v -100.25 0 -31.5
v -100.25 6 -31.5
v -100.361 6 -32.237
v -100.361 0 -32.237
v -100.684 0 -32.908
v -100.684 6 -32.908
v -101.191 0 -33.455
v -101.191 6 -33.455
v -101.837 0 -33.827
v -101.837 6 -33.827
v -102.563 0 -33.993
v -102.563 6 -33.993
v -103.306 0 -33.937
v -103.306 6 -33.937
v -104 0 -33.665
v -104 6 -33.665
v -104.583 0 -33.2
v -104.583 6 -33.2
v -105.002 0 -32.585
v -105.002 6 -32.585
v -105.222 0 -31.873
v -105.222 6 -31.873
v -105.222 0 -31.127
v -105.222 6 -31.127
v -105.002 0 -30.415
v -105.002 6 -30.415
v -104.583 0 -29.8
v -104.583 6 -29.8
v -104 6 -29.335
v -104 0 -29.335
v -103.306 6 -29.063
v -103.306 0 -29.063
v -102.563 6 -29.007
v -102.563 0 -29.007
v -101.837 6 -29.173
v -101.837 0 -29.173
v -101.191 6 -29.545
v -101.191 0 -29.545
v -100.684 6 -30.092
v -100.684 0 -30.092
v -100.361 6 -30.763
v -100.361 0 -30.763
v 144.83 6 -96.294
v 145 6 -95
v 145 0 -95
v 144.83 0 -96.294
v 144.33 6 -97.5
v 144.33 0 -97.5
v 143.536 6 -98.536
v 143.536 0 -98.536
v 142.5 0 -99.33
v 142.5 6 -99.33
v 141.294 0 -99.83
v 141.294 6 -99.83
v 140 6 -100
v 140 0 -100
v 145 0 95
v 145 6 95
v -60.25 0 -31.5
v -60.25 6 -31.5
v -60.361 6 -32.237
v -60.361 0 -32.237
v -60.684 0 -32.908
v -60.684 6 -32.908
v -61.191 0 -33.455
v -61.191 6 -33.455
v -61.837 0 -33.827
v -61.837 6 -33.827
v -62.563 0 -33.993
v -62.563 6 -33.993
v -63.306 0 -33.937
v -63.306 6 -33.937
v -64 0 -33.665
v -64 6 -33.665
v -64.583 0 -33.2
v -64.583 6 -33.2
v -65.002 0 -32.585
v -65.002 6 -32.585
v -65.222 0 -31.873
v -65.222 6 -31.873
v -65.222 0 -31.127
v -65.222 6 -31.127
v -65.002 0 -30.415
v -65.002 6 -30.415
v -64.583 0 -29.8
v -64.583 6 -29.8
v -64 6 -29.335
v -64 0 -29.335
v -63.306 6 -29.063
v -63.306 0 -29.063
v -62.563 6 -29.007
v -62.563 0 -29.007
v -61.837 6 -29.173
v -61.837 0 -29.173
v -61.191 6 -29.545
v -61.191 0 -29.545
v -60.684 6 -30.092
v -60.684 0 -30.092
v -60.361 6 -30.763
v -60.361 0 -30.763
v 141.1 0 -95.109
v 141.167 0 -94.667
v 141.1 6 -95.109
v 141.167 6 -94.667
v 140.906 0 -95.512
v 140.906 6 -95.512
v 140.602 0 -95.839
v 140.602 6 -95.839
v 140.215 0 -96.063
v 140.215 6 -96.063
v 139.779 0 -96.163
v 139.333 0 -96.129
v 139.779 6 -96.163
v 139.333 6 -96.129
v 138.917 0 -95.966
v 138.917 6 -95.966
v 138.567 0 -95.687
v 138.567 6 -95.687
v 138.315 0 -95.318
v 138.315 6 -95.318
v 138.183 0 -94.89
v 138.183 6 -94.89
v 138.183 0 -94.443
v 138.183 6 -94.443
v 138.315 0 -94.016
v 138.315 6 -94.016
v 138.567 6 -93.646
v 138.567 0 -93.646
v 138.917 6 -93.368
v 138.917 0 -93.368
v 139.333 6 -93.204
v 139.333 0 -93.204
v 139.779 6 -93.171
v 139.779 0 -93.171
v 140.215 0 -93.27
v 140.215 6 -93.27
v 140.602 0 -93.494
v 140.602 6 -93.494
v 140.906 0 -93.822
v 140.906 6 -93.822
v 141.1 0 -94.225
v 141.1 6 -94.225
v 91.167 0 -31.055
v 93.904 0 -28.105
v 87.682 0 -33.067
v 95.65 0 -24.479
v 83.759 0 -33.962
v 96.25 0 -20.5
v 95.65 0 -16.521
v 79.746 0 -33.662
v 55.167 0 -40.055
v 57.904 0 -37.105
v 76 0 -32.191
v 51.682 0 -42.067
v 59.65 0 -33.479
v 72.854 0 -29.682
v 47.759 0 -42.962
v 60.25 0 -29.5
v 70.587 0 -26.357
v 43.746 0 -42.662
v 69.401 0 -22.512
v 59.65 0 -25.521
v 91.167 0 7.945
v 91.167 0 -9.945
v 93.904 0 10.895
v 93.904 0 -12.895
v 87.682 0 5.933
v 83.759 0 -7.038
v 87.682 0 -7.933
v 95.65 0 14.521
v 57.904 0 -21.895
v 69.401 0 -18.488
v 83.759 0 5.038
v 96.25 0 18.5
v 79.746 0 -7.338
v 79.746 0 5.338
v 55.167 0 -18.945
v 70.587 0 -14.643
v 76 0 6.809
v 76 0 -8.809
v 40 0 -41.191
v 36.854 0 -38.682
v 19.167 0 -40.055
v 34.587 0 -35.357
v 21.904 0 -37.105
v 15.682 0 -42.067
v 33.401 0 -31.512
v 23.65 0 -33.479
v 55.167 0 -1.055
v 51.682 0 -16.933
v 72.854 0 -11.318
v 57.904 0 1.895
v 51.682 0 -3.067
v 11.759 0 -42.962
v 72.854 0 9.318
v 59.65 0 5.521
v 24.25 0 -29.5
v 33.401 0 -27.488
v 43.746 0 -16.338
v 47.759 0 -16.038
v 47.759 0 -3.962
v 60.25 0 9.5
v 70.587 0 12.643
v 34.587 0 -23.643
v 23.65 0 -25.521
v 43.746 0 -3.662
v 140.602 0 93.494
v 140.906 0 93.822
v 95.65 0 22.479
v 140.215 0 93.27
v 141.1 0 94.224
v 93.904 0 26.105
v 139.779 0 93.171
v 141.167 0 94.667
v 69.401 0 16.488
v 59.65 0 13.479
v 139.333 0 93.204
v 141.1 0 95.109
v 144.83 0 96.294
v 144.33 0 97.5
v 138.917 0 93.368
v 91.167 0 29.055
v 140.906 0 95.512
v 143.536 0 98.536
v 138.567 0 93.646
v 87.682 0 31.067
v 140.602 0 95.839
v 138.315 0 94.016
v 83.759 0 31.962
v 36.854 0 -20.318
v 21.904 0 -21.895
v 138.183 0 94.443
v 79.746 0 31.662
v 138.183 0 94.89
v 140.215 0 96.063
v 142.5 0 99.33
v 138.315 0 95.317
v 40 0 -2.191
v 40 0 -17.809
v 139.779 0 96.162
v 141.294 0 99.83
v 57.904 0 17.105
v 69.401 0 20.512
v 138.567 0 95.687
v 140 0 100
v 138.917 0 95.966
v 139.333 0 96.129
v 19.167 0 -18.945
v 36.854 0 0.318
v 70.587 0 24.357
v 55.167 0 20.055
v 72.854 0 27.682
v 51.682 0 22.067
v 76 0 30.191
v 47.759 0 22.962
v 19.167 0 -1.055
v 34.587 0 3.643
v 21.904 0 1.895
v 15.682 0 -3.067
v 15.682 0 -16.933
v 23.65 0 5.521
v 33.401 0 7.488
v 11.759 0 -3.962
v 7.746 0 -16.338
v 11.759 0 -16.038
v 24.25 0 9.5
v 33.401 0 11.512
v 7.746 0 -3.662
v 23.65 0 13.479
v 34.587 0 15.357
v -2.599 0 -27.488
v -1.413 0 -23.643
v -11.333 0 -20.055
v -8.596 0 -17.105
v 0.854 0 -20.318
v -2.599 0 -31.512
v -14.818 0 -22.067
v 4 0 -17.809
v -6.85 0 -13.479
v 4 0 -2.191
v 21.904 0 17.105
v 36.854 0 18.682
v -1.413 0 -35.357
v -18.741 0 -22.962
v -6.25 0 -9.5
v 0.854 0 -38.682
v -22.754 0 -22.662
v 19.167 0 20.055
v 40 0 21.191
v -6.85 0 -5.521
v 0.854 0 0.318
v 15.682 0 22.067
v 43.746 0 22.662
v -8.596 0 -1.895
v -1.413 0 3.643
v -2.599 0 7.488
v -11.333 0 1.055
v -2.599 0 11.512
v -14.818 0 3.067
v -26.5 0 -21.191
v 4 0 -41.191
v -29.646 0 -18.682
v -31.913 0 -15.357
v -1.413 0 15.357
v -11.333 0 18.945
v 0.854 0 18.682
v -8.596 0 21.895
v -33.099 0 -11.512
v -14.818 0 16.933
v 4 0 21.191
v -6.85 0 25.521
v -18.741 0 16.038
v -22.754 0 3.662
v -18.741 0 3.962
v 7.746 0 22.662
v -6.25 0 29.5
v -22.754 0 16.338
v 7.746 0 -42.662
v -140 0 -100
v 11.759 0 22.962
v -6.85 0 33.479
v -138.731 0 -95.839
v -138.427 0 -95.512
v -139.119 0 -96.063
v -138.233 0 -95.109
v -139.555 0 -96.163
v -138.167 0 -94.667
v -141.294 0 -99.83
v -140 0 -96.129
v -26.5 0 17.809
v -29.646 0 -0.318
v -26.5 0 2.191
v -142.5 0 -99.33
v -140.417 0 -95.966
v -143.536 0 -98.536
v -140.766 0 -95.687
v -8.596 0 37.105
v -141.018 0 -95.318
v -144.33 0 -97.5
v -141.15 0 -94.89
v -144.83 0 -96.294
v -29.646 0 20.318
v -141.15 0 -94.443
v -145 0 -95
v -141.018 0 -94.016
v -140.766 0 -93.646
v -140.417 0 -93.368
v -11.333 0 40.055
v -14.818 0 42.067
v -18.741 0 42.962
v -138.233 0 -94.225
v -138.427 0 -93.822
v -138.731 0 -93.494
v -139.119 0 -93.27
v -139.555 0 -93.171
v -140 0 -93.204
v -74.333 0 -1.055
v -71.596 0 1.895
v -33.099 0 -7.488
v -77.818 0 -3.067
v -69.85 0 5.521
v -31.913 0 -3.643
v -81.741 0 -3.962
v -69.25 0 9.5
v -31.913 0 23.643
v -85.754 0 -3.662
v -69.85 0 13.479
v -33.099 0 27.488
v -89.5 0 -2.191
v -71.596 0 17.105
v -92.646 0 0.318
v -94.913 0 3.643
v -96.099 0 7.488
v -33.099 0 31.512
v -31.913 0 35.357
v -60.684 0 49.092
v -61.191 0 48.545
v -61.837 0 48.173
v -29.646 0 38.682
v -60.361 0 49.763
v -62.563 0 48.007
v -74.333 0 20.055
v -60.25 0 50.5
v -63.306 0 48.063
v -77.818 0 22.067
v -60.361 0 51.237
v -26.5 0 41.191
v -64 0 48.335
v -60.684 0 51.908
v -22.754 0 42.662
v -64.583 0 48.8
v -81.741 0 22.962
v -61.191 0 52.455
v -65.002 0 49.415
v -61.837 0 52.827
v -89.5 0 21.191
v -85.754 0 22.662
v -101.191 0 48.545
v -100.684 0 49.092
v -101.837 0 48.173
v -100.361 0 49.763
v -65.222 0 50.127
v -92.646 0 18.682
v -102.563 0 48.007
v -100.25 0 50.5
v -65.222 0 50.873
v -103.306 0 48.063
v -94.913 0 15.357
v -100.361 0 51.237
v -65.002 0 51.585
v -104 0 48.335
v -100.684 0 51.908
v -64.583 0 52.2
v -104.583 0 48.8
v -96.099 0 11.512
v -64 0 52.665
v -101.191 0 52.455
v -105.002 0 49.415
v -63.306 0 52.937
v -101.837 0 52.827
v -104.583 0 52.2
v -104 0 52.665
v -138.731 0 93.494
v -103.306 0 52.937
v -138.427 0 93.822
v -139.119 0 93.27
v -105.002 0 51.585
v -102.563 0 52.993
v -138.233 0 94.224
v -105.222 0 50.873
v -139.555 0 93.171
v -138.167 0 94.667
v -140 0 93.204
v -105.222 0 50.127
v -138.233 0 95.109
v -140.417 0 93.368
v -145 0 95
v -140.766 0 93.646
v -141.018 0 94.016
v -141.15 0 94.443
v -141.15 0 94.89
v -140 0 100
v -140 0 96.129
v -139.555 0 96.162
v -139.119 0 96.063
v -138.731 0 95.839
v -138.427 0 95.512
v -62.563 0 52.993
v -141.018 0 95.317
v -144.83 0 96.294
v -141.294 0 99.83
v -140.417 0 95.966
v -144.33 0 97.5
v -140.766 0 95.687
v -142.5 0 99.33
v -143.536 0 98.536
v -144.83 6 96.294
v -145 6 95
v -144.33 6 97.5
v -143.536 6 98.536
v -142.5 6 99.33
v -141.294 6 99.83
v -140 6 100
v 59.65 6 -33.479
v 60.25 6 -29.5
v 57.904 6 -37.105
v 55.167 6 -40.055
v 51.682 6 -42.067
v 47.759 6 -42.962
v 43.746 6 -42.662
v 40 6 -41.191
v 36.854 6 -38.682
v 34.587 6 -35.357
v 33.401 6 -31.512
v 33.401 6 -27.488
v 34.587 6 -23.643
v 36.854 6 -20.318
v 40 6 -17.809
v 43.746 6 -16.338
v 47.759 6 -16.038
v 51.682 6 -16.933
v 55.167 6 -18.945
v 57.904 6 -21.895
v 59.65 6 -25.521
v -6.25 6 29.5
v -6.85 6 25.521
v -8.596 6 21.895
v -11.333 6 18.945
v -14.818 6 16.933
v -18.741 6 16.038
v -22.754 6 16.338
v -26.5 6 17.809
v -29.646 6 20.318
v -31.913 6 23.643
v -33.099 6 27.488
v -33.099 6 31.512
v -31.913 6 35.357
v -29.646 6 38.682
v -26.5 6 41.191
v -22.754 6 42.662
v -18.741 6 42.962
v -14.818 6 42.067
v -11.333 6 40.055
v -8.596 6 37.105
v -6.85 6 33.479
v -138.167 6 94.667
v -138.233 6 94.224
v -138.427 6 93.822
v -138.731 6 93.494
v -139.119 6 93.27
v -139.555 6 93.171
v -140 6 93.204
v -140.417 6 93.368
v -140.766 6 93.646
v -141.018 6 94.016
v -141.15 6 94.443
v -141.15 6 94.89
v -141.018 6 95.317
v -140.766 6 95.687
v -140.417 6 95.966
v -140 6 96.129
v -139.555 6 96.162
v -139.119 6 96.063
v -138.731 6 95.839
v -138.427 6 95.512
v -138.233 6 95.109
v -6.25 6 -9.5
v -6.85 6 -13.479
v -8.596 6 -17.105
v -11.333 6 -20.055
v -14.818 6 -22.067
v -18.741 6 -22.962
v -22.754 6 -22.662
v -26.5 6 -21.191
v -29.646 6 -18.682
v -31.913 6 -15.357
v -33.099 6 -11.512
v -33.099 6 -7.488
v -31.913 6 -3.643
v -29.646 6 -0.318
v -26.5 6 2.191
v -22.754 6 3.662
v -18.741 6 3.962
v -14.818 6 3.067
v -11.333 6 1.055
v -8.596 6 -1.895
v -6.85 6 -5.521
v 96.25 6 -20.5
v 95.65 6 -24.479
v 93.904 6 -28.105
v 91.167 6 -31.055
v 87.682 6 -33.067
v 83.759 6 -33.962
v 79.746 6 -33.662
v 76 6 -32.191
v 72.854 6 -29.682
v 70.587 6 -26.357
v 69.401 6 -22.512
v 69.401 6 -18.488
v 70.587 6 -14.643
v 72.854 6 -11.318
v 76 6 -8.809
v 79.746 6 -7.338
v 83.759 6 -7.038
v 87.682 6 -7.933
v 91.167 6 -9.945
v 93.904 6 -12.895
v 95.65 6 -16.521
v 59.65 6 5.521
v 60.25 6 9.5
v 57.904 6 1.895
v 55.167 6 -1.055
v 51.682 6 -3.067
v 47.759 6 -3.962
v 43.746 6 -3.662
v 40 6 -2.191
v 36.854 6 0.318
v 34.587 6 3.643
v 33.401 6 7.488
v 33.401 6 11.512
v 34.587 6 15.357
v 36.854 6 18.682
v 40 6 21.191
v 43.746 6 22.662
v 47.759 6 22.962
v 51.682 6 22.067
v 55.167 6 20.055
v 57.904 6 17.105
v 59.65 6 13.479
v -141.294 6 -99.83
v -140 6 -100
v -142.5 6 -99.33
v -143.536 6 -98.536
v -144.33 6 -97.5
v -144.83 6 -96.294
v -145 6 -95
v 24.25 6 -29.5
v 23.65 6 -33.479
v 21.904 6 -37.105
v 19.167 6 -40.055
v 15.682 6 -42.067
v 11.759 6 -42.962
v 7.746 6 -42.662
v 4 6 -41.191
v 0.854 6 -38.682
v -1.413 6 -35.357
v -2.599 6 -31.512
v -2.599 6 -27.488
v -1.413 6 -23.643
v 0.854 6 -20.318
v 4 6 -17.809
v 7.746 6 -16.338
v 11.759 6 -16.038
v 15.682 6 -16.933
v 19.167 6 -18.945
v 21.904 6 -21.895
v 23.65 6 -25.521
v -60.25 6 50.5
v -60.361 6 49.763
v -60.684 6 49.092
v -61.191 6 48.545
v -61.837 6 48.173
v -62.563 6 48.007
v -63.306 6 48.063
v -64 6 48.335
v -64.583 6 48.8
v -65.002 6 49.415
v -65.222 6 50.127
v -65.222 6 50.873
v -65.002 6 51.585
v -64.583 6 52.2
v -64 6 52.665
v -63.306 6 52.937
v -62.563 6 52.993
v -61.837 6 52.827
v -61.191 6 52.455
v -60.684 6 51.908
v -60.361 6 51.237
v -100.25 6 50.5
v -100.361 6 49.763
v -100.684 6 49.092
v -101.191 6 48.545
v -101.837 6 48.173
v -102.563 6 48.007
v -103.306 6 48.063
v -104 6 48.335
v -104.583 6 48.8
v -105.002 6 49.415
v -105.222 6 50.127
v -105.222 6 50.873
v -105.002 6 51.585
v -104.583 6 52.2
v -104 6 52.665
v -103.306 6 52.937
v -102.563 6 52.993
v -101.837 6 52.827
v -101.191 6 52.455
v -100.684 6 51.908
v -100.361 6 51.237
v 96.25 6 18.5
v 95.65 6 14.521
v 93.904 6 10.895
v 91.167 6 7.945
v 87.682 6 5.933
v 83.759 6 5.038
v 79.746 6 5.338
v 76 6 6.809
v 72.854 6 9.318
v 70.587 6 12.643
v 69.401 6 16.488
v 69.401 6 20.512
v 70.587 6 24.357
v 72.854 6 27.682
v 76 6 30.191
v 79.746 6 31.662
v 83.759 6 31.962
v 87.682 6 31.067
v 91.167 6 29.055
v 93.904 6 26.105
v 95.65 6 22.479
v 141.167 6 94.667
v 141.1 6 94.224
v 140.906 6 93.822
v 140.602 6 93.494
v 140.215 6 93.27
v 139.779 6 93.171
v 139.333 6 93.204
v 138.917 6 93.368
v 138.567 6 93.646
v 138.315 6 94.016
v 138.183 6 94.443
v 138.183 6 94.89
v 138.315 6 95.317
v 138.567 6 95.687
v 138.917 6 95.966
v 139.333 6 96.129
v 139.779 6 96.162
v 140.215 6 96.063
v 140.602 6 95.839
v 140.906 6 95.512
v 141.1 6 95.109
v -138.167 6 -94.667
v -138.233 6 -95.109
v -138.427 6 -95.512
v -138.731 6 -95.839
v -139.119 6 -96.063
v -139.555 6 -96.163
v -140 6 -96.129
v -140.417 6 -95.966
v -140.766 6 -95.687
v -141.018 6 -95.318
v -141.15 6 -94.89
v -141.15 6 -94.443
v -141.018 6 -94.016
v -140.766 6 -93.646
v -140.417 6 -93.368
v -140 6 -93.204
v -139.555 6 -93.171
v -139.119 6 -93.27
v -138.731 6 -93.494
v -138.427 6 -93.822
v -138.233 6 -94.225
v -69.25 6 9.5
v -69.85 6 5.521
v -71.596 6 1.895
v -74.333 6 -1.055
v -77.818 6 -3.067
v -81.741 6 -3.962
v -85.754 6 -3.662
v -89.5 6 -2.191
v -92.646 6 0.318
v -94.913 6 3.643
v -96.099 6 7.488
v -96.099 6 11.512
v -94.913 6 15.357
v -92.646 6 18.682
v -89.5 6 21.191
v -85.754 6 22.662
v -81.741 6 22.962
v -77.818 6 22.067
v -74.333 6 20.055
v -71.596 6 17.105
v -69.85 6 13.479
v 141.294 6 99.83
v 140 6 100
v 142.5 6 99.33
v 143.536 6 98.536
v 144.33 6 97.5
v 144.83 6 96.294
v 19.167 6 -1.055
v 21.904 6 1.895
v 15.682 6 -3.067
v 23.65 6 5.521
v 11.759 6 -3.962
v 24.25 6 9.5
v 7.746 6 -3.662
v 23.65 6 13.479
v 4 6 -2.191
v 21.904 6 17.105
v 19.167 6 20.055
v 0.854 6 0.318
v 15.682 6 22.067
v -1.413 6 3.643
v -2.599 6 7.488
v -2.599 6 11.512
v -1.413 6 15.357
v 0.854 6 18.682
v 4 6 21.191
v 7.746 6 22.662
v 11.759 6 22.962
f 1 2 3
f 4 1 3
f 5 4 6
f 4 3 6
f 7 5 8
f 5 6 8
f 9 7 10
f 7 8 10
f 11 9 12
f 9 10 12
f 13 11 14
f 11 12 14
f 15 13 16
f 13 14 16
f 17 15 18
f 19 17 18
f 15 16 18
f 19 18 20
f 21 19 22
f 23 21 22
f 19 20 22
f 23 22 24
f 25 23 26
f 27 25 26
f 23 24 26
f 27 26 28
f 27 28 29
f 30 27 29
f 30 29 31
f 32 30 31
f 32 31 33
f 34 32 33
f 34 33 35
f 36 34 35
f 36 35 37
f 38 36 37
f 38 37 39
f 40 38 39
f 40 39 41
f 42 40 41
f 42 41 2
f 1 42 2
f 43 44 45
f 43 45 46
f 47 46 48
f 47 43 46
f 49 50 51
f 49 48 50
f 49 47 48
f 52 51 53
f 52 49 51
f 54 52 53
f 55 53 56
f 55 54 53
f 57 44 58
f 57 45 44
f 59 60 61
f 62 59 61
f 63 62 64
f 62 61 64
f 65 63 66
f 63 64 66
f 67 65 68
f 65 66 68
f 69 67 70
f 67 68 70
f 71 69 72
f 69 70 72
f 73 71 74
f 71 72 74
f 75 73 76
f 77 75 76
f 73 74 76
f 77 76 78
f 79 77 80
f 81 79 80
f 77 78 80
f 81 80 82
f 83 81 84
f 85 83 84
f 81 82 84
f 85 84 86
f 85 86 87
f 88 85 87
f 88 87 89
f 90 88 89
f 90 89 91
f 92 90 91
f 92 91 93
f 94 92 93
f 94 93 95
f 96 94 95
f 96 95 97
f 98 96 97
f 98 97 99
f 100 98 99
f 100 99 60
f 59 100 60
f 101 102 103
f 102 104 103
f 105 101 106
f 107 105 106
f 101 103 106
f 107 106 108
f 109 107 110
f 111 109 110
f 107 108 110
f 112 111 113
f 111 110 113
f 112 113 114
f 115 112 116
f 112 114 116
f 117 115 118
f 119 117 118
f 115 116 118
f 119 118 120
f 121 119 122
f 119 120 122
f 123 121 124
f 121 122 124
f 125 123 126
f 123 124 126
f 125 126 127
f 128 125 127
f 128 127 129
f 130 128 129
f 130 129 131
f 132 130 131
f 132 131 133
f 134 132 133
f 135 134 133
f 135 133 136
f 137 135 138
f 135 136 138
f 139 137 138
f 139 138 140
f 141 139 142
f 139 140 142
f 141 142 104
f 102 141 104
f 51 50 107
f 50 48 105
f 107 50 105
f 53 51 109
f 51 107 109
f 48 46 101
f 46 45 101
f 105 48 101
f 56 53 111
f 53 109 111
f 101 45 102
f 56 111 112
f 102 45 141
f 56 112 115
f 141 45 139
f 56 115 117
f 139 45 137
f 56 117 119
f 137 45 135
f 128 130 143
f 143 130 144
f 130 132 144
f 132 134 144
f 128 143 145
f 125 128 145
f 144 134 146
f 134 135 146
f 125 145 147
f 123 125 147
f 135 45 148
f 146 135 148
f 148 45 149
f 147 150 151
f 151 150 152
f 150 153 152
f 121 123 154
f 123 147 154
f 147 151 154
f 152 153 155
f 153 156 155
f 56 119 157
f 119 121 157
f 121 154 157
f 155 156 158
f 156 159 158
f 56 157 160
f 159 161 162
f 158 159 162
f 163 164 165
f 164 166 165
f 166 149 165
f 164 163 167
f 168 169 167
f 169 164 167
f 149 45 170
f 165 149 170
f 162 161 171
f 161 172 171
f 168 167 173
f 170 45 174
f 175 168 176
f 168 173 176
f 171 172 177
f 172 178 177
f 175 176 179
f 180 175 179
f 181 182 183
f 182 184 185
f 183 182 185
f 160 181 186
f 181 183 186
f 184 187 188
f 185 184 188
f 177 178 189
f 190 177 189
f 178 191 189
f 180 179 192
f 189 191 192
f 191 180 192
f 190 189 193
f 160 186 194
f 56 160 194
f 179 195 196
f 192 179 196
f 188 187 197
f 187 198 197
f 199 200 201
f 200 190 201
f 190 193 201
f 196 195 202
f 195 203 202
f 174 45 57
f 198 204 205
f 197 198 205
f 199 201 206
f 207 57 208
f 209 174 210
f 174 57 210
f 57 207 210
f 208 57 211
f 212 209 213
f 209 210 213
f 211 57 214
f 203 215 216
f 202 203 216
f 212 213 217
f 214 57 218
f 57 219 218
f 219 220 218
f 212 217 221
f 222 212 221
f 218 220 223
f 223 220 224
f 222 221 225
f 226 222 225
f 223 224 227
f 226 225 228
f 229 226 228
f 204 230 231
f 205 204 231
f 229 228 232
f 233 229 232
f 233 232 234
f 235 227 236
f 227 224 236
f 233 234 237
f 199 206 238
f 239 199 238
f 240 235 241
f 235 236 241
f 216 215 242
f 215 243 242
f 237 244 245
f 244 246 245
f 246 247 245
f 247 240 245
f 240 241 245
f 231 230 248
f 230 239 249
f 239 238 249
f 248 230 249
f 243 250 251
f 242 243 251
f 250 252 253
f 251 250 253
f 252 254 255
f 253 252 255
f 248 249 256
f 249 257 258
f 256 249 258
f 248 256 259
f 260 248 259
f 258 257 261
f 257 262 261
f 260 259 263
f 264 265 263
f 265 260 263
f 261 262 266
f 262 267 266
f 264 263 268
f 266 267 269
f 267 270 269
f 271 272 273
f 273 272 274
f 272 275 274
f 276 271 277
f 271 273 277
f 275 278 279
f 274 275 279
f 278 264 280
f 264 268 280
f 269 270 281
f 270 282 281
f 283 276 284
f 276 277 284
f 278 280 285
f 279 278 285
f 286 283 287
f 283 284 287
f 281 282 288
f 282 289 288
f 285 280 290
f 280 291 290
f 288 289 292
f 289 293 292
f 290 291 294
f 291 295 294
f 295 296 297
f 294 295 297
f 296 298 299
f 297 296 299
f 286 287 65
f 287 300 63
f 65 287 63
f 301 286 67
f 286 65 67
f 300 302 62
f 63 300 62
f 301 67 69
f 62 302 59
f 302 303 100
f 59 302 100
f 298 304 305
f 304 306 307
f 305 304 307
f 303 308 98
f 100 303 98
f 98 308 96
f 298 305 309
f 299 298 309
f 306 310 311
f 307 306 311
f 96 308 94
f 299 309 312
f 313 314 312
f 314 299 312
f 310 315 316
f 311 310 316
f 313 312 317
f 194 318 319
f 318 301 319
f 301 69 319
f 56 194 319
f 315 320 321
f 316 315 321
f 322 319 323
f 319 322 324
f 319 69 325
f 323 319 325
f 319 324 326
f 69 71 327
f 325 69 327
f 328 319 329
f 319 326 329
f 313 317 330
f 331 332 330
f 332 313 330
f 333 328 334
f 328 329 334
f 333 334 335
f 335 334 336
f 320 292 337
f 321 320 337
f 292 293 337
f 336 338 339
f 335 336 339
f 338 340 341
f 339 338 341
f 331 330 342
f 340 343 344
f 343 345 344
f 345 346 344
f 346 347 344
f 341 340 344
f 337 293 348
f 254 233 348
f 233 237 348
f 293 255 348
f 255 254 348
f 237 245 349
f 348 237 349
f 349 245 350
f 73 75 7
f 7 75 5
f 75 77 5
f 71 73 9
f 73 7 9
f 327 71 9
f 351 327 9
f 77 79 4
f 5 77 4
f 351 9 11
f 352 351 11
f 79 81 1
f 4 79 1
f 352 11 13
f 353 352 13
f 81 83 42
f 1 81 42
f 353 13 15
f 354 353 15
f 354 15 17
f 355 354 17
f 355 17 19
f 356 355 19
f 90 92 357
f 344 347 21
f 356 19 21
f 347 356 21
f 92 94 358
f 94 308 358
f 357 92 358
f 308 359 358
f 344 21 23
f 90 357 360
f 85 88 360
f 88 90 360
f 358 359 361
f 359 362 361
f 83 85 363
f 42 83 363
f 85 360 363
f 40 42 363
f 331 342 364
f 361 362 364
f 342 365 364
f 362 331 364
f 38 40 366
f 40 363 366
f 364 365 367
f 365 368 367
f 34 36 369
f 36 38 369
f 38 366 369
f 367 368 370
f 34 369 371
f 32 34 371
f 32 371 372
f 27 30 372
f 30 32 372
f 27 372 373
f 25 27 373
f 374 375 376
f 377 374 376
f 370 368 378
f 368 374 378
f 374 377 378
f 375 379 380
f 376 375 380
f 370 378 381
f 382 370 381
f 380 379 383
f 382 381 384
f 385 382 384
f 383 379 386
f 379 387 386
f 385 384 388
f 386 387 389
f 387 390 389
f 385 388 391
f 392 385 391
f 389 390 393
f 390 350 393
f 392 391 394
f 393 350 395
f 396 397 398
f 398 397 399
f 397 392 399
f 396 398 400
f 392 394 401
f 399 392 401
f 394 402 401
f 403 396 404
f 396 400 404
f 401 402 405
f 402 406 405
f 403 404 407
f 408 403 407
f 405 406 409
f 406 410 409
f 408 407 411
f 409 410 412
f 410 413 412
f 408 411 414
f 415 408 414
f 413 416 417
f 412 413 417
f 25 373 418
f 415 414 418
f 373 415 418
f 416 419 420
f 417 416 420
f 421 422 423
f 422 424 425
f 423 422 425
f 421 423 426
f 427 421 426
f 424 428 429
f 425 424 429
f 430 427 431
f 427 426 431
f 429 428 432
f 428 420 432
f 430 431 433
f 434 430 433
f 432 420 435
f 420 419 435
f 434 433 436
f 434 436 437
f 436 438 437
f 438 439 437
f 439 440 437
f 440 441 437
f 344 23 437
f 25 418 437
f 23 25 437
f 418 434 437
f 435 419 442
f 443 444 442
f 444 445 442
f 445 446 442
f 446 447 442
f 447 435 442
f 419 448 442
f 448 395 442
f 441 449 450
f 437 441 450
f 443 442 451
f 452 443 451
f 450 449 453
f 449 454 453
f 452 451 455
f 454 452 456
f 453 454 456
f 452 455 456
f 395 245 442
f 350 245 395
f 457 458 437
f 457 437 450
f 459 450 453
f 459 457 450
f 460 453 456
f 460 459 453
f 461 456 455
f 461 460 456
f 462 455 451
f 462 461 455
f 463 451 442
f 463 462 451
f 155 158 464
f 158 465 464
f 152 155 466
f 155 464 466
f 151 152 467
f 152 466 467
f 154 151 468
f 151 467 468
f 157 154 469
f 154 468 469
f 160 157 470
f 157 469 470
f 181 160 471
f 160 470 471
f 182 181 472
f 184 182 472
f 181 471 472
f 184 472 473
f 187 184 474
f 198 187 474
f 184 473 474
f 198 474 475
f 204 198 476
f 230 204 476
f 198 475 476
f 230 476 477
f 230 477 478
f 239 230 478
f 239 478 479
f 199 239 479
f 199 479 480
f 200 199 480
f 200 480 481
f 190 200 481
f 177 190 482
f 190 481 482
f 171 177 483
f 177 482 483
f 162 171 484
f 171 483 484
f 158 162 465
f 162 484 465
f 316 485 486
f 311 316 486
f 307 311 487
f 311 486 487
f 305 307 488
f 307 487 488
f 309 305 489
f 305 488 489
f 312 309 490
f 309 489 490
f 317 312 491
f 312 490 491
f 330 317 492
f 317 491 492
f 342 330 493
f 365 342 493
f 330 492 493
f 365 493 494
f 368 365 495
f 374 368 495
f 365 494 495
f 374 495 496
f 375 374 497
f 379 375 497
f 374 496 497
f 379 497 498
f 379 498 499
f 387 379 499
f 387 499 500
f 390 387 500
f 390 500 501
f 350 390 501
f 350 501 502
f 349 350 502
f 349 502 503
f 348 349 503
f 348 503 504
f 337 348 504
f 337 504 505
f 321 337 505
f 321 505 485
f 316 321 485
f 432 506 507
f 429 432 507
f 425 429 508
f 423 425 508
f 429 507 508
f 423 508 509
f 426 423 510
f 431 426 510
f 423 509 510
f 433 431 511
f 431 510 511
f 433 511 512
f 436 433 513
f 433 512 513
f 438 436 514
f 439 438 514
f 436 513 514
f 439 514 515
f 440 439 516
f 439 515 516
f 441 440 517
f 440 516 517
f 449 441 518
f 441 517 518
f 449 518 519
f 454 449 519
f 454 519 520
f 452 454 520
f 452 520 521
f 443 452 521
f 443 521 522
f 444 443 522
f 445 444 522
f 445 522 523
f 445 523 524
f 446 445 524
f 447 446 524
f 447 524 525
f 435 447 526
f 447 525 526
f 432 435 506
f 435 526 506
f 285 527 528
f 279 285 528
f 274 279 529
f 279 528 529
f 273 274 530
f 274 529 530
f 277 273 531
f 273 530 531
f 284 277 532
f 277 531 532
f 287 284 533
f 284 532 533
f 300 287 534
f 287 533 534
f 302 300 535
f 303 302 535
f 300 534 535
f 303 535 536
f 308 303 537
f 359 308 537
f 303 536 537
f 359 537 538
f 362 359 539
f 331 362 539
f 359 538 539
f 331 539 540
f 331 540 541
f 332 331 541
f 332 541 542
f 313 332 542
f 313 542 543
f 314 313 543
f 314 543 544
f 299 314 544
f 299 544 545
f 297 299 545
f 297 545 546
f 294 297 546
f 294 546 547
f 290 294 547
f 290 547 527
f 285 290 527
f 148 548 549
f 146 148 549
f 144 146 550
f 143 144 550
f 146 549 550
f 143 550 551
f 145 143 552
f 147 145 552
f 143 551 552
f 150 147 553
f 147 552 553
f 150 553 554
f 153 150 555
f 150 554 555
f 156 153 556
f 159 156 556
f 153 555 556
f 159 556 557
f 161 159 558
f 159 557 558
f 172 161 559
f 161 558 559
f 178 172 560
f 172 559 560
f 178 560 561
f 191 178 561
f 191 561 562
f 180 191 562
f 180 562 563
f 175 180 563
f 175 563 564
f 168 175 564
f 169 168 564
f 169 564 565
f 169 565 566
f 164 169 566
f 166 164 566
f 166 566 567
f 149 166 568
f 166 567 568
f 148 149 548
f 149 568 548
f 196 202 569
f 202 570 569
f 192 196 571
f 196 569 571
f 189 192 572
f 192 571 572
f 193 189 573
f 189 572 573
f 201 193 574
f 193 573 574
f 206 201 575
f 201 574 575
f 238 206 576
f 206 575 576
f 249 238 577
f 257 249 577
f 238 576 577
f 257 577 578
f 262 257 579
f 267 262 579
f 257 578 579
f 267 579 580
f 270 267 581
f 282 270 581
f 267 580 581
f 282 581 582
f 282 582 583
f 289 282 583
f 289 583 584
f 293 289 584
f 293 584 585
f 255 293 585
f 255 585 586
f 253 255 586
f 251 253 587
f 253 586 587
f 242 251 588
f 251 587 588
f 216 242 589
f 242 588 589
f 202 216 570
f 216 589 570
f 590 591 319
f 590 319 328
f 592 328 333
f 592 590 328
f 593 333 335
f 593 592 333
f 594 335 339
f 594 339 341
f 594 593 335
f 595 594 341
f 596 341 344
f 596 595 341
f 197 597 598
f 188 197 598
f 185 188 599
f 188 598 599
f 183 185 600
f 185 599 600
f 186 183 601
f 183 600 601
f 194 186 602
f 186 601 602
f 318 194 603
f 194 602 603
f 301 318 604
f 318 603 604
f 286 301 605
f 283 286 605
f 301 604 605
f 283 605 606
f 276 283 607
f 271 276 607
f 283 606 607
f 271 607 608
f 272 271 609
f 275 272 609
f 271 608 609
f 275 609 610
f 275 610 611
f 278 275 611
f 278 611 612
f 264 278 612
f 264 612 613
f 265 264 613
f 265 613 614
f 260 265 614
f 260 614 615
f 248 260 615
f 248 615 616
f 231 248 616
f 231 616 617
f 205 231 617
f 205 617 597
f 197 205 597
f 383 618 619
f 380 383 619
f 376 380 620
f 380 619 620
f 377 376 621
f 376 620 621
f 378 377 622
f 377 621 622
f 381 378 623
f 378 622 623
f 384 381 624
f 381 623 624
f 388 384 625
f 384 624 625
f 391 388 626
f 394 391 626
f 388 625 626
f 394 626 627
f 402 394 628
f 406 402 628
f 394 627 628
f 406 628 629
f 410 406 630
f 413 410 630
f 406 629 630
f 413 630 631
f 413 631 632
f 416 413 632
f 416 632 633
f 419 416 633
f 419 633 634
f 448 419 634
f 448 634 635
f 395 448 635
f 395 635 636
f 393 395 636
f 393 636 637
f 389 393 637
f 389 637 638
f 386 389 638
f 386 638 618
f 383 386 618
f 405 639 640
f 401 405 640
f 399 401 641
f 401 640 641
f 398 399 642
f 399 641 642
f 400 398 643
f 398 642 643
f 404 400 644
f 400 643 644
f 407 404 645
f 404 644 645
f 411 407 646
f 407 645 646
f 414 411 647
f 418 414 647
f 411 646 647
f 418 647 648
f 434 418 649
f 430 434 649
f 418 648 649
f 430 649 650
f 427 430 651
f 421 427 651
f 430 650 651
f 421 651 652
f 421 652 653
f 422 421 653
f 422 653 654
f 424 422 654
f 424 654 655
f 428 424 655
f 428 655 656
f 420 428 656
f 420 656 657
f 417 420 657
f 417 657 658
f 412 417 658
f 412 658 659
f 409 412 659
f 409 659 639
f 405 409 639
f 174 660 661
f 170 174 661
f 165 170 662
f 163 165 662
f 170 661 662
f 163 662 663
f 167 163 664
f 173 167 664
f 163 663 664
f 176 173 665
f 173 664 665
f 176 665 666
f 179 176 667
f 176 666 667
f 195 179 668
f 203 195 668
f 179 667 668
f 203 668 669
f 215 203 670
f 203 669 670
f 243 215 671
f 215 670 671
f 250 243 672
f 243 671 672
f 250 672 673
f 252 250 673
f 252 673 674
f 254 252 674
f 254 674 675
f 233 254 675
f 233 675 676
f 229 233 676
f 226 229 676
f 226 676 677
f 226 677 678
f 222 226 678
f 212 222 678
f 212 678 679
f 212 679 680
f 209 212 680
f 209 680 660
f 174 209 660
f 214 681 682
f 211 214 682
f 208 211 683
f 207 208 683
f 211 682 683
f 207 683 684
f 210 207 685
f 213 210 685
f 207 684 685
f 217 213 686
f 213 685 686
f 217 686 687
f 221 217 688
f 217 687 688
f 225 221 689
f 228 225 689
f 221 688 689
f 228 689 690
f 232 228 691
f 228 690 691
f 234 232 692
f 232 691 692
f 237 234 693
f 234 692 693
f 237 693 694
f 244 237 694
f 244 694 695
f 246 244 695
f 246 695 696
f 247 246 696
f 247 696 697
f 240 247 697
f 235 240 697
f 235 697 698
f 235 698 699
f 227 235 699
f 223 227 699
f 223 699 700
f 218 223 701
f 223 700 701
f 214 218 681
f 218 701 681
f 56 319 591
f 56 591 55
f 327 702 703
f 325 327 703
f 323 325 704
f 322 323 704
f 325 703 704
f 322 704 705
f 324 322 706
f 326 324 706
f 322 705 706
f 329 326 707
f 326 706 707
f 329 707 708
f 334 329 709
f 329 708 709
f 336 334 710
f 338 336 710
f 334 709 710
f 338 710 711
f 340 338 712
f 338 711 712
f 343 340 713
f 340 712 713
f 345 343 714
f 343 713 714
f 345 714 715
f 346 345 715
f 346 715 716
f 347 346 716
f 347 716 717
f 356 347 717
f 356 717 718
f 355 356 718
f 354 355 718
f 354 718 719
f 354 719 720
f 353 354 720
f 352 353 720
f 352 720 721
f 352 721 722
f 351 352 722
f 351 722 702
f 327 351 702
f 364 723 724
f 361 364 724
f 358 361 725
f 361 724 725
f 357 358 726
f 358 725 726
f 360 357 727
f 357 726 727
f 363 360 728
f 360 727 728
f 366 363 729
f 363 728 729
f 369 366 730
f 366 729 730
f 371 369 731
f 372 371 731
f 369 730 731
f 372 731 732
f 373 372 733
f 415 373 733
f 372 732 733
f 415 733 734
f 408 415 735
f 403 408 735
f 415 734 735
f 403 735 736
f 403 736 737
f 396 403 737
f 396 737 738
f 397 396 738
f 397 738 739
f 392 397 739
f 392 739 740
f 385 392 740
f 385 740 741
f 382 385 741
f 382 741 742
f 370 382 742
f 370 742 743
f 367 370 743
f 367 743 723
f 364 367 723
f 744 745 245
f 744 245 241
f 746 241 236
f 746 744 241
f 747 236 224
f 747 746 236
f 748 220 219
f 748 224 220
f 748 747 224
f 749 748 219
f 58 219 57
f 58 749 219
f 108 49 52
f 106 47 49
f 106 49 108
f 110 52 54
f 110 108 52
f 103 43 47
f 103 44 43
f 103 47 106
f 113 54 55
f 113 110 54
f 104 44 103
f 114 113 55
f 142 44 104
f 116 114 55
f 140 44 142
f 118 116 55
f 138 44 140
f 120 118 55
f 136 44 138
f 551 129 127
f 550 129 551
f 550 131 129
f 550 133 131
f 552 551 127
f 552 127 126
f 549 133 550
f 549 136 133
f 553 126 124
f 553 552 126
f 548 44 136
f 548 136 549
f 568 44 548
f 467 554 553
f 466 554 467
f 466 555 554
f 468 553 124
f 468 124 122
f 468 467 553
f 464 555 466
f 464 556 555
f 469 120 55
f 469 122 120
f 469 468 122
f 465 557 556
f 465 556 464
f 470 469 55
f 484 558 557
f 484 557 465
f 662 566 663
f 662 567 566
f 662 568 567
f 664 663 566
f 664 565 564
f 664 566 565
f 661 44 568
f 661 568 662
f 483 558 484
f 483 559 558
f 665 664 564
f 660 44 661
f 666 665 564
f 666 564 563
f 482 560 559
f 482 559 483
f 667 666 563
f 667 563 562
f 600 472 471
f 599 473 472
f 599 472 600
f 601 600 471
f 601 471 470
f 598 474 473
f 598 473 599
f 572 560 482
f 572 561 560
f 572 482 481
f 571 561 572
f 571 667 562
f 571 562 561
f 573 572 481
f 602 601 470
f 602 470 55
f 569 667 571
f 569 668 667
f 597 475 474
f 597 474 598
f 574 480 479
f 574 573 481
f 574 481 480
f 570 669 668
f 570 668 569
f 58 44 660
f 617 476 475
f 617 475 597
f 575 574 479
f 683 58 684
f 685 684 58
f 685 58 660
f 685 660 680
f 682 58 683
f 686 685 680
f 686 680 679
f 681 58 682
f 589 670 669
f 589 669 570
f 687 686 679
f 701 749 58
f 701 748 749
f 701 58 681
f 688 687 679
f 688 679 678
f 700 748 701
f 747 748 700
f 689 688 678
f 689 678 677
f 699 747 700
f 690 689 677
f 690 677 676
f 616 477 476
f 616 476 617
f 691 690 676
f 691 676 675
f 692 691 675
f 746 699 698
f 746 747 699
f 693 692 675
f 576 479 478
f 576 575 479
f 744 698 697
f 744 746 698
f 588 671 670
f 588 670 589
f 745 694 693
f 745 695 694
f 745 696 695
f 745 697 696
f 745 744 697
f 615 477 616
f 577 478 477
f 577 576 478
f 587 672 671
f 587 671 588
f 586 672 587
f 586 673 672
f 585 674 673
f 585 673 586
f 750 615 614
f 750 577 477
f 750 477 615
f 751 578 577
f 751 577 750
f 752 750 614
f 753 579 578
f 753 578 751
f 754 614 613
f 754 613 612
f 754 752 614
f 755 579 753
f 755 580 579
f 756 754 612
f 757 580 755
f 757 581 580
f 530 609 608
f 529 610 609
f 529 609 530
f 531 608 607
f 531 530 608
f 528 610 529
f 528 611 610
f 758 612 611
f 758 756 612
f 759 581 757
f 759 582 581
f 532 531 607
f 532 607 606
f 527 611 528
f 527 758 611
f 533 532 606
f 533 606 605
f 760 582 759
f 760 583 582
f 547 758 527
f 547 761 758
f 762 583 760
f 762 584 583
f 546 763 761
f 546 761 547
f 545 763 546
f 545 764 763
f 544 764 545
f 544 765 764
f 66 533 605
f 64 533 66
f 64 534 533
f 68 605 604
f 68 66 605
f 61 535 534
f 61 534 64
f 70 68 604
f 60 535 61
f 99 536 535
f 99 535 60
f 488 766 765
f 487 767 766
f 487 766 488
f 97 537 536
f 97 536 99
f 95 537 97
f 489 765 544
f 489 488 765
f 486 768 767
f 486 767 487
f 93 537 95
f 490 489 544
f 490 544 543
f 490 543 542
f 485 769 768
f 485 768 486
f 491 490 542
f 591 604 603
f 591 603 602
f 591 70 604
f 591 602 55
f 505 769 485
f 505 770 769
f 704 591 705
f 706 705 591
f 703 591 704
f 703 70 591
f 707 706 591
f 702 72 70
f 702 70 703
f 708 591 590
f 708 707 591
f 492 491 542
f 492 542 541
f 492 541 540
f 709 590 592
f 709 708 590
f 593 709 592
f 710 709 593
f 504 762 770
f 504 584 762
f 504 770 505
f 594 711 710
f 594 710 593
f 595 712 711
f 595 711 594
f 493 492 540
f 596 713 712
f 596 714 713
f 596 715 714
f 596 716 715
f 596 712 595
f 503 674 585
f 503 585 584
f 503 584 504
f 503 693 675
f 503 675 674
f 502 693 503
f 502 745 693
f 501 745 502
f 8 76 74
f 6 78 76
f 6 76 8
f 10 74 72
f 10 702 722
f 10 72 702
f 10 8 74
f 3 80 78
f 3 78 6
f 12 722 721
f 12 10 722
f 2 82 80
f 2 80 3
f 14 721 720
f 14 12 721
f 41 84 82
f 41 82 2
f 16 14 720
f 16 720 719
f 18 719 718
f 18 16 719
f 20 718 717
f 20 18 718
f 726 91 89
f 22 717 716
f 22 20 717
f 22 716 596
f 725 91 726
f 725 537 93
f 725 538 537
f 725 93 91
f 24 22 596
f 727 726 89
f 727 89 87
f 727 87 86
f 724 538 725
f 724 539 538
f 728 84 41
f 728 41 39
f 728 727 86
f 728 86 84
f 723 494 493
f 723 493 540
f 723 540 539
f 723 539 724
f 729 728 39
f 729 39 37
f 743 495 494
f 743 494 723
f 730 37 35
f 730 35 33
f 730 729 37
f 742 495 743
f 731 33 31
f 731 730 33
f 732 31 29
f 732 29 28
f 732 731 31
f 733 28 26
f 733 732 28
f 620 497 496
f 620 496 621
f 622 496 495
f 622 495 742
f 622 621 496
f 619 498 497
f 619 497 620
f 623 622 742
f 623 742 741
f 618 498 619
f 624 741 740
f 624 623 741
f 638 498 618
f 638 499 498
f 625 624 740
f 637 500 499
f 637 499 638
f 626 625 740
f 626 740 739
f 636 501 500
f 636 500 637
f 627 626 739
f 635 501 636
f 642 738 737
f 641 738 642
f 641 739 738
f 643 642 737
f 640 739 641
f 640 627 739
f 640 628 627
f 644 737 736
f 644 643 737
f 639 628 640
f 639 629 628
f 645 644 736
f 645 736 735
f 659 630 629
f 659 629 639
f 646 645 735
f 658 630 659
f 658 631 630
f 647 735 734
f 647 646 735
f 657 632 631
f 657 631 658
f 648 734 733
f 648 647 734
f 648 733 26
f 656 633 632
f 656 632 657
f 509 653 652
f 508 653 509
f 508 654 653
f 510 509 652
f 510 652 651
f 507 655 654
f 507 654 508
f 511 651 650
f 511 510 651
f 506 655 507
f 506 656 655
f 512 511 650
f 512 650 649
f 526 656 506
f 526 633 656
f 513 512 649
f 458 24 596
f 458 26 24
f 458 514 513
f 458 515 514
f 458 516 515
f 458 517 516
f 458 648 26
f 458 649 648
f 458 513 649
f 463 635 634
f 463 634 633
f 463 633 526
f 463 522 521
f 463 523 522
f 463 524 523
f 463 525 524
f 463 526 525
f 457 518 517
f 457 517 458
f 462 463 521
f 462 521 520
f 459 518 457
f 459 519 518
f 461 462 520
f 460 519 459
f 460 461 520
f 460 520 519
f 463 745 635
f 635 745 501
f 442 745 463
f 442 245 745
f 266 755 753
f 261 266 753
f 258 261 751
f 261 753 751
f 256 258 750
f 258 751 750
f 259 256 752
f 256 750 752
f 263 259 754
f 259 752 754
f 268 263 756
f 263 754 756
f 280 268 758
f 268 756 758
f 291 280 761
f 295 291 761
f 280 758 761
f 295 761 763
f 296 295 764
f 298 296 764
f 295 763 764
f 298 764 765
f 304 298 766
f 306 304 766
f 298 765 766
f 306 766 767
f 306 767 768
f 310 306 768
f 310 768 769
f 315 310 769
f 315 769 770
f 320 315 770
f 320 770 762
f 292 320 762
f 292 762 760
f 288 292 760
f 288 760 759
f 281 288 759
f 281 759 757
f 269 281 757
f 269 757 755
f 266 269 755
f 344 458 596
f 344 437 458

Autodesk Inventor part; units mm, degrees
ref_plane "YZ Plane" through (0, 0, 0) normal (1, 0, 0) x (0, 1, 0)
ref_plane "XZ Plane" through (0, 0, 0) normal (0, 1, 0) x (-1, 0, 0)
ref_plane "XY Plane" through (0, 0, 0) normal (0, 0, 1) x (1, 0, 0)
sketch "Sketch1" plane through (0, 0, 0) normal (0, 1, 0) x (-1, 0, 0)
  line L0 (145, -100) -> (-145, -100)
  line L1 (-145, -100) -> (-145, 100)
  line L2 (-145, 100) -> (145, 100)
  line L3 (145, 100) -> (145, -100)
  line L4 (210, 0) -> (-210, 0) projected
  line L5 (0, -140) -> (0, 140) projected
  point P0 (0, 0)
  dimension "d30" = 290
  dimension "d31" = 200
extrude "Extrusion1" add sketch "Sketch1" along normal blind 6
sketch "Sketch2" plane through (0, 6, 0) normal (0, 1, 0) x (1, 0, 0)
  circle A0 centre (-19.75, -29.5) radius 13.5
  circle A1 centre (-82.75, -9.5) radius 13.5
  circle A2 centre (-19.75, 9.5) radius 13.5
  circle A3 centre (46.75, 29.5) radius 13.5
  circle A4 centre (82.75, 20.5) radius 13.5
  circle A5 centre (10.75, 29.5) radius 13.5
  circle A6 centre (10.75, -9.5) radius 13.5
  circle A7 centre (46.75, -9.5) radius 13.5
  circle A8 centre (82.75, -18.5) radius 13.5
  line L0 (-96.25, 43) -> (96.25, 43)
  line L1 (96.25, 43) -> (96.25, -43)
  line L2 (96.25, -43) -> (-96.25, -43)
  line L3 (-96.25, -43) -> (-96.25, 43)
  line L4 (145, 100) -> (-145, 100) projected
  line L5 (145, -100) -> (145, 100) projected
  line L6 (0, 140) -> (0, -140) projected
  line L7 (-210, 0) -> (210, 0) projected
  line L8 (-102.75, 31.5) -> (-62.75, 31.5)
  line L9 (-62.75, 31.5) -> (-62.75, -50.5)
  line L10 (-62.75, -50.5) -> (-102.75, -50.5)
  line L11 (-102.75, -50.5) -> (-102.75, 31.5)
  circle A9 centre (-102.75, 31.5) radius 2.5
  circle A10 centre (-62.75, 31.5) radius 2.5
  circle A11 centre (-102.75, -50.5) radius 2.5
  circle A12 centre (-62.75, -50.5) radius 2.5
  dimension "d3" = 27
  dimension "d19" = 30.5
  dimension "d20" = 36
  dimension "d23" = 19
  dimension "d24" = 9
  dimension "d25" = 36
  dimension "d26" = 11
  dimension "d27" = 9
  dimension "d28" = 11
  dimension "d29" = 63
  dimension "d35" = 41
  dimension "d36" = 41
  dimension "d37" = 20
  dimension "d38" = 20
  dimension "d39" = 5
  dimension "d40" = 5
  dimension "d41" = 5
  dimension "d42" = 5
extrude "Extrusion2" cut sketch "Sketch2" against normal blind 30 contours A0 | A8 | L6 A6 L7 | A6 L6 | A12 L10 L9 | L9 L10 A12 | A1 L7 | L7 A1 | L7 A2 | A2 L7 | A10 L8 L9 | L9 L8 A10 | A4 | A3 | A6 L7 | A11 L11 L10 | L10 L11 A11 | L7 A7 | A7 L7 | L6 A5 | A5 L6 | A9 L11 L8 | L8 L11 A9 picked at (6.7806, -6.3333)
fillet "Fillet1" radius 5 4 edges at (-145, 3, 100) (145, 3, 100) (145, 3, -100) (-145, 3, -100)
sketch "Sketch3" plane through (0, 6, 0) normal (0, 1, 0) x (1, 0, 0)
  circle A0 centre (-139.6667, 94.6667) radius 1.5
  line L0 (140, 100) -> (-140, 100) projected
  line L1 (-145, 95) -> (-145, -95) projected
  point P0 (0, 0)
  dimension "d43" = 5.3333
  dimension "d44" = 5.3333
  dimension "d53" = 3
extrude "Extrusion3" cut sketch "Sketch3" against normal blind 20
pattern_linear "Rectangular Pattern1" count 2 spacing 279.3333 along (1, 0, 0) count 2 spacing 189.3333 along (0, 0, 1) of "Extrusion3"
equation "\"d30\" = BoxLength"
equation "\"d31\" = BoxWidth"
equation "\"d3\" = JS_Hole_dia"
equation "\"d36\" = 0.5 * JS_SH_L"
equation "\"d37\" = 0.5 * JS_SH_W"
equation "\"d38\" = 0.5 * JS_SH_W"
equation "\"d39\" = JS_SH_dia"
equation "\"d40\" = JS_SH_dia"
equation "\"d41\" = JS_SH_dia"
equation "\"d42\" = JS_SH_dia"
equation "\"d34\" = CornerOffset"
equation "\"d43\" = 0.666667 * CornerOffset + 0.333333 * SheetThickness"
equation "\"d44\" = 0.666667 * CornerOffset + 0.333333 * SheetThickness"
equation "\"d49\" = BoxLength - 1.33333 * CornerOffset - 0.666667 * SheetThickness"
equation "\"d52\" = BoxWidth - 1.33333 * CornerOffset - 0.666667 * SheetThickness"
equation "\"BoxLength\" = 290"
equation "\"BoxWidth\" = 200"
equation "\"JS_SH_L\" = 82"
equation "\"JS_SH_dia\" = 5"
equation "\"SheetThickness\" = 6"
equation "\"CornerOffset\" = 5"
equation "\"NutS\" = 5.7"
equation "\"NutThreadD2\" = 4.17"
equation "\"SideNutWidth\" = 2.5"
equation "\"JS_Hole_dia\" = 27"
equation "\"JS_SH_W\" = 40"
properties part number "sega_straight"
